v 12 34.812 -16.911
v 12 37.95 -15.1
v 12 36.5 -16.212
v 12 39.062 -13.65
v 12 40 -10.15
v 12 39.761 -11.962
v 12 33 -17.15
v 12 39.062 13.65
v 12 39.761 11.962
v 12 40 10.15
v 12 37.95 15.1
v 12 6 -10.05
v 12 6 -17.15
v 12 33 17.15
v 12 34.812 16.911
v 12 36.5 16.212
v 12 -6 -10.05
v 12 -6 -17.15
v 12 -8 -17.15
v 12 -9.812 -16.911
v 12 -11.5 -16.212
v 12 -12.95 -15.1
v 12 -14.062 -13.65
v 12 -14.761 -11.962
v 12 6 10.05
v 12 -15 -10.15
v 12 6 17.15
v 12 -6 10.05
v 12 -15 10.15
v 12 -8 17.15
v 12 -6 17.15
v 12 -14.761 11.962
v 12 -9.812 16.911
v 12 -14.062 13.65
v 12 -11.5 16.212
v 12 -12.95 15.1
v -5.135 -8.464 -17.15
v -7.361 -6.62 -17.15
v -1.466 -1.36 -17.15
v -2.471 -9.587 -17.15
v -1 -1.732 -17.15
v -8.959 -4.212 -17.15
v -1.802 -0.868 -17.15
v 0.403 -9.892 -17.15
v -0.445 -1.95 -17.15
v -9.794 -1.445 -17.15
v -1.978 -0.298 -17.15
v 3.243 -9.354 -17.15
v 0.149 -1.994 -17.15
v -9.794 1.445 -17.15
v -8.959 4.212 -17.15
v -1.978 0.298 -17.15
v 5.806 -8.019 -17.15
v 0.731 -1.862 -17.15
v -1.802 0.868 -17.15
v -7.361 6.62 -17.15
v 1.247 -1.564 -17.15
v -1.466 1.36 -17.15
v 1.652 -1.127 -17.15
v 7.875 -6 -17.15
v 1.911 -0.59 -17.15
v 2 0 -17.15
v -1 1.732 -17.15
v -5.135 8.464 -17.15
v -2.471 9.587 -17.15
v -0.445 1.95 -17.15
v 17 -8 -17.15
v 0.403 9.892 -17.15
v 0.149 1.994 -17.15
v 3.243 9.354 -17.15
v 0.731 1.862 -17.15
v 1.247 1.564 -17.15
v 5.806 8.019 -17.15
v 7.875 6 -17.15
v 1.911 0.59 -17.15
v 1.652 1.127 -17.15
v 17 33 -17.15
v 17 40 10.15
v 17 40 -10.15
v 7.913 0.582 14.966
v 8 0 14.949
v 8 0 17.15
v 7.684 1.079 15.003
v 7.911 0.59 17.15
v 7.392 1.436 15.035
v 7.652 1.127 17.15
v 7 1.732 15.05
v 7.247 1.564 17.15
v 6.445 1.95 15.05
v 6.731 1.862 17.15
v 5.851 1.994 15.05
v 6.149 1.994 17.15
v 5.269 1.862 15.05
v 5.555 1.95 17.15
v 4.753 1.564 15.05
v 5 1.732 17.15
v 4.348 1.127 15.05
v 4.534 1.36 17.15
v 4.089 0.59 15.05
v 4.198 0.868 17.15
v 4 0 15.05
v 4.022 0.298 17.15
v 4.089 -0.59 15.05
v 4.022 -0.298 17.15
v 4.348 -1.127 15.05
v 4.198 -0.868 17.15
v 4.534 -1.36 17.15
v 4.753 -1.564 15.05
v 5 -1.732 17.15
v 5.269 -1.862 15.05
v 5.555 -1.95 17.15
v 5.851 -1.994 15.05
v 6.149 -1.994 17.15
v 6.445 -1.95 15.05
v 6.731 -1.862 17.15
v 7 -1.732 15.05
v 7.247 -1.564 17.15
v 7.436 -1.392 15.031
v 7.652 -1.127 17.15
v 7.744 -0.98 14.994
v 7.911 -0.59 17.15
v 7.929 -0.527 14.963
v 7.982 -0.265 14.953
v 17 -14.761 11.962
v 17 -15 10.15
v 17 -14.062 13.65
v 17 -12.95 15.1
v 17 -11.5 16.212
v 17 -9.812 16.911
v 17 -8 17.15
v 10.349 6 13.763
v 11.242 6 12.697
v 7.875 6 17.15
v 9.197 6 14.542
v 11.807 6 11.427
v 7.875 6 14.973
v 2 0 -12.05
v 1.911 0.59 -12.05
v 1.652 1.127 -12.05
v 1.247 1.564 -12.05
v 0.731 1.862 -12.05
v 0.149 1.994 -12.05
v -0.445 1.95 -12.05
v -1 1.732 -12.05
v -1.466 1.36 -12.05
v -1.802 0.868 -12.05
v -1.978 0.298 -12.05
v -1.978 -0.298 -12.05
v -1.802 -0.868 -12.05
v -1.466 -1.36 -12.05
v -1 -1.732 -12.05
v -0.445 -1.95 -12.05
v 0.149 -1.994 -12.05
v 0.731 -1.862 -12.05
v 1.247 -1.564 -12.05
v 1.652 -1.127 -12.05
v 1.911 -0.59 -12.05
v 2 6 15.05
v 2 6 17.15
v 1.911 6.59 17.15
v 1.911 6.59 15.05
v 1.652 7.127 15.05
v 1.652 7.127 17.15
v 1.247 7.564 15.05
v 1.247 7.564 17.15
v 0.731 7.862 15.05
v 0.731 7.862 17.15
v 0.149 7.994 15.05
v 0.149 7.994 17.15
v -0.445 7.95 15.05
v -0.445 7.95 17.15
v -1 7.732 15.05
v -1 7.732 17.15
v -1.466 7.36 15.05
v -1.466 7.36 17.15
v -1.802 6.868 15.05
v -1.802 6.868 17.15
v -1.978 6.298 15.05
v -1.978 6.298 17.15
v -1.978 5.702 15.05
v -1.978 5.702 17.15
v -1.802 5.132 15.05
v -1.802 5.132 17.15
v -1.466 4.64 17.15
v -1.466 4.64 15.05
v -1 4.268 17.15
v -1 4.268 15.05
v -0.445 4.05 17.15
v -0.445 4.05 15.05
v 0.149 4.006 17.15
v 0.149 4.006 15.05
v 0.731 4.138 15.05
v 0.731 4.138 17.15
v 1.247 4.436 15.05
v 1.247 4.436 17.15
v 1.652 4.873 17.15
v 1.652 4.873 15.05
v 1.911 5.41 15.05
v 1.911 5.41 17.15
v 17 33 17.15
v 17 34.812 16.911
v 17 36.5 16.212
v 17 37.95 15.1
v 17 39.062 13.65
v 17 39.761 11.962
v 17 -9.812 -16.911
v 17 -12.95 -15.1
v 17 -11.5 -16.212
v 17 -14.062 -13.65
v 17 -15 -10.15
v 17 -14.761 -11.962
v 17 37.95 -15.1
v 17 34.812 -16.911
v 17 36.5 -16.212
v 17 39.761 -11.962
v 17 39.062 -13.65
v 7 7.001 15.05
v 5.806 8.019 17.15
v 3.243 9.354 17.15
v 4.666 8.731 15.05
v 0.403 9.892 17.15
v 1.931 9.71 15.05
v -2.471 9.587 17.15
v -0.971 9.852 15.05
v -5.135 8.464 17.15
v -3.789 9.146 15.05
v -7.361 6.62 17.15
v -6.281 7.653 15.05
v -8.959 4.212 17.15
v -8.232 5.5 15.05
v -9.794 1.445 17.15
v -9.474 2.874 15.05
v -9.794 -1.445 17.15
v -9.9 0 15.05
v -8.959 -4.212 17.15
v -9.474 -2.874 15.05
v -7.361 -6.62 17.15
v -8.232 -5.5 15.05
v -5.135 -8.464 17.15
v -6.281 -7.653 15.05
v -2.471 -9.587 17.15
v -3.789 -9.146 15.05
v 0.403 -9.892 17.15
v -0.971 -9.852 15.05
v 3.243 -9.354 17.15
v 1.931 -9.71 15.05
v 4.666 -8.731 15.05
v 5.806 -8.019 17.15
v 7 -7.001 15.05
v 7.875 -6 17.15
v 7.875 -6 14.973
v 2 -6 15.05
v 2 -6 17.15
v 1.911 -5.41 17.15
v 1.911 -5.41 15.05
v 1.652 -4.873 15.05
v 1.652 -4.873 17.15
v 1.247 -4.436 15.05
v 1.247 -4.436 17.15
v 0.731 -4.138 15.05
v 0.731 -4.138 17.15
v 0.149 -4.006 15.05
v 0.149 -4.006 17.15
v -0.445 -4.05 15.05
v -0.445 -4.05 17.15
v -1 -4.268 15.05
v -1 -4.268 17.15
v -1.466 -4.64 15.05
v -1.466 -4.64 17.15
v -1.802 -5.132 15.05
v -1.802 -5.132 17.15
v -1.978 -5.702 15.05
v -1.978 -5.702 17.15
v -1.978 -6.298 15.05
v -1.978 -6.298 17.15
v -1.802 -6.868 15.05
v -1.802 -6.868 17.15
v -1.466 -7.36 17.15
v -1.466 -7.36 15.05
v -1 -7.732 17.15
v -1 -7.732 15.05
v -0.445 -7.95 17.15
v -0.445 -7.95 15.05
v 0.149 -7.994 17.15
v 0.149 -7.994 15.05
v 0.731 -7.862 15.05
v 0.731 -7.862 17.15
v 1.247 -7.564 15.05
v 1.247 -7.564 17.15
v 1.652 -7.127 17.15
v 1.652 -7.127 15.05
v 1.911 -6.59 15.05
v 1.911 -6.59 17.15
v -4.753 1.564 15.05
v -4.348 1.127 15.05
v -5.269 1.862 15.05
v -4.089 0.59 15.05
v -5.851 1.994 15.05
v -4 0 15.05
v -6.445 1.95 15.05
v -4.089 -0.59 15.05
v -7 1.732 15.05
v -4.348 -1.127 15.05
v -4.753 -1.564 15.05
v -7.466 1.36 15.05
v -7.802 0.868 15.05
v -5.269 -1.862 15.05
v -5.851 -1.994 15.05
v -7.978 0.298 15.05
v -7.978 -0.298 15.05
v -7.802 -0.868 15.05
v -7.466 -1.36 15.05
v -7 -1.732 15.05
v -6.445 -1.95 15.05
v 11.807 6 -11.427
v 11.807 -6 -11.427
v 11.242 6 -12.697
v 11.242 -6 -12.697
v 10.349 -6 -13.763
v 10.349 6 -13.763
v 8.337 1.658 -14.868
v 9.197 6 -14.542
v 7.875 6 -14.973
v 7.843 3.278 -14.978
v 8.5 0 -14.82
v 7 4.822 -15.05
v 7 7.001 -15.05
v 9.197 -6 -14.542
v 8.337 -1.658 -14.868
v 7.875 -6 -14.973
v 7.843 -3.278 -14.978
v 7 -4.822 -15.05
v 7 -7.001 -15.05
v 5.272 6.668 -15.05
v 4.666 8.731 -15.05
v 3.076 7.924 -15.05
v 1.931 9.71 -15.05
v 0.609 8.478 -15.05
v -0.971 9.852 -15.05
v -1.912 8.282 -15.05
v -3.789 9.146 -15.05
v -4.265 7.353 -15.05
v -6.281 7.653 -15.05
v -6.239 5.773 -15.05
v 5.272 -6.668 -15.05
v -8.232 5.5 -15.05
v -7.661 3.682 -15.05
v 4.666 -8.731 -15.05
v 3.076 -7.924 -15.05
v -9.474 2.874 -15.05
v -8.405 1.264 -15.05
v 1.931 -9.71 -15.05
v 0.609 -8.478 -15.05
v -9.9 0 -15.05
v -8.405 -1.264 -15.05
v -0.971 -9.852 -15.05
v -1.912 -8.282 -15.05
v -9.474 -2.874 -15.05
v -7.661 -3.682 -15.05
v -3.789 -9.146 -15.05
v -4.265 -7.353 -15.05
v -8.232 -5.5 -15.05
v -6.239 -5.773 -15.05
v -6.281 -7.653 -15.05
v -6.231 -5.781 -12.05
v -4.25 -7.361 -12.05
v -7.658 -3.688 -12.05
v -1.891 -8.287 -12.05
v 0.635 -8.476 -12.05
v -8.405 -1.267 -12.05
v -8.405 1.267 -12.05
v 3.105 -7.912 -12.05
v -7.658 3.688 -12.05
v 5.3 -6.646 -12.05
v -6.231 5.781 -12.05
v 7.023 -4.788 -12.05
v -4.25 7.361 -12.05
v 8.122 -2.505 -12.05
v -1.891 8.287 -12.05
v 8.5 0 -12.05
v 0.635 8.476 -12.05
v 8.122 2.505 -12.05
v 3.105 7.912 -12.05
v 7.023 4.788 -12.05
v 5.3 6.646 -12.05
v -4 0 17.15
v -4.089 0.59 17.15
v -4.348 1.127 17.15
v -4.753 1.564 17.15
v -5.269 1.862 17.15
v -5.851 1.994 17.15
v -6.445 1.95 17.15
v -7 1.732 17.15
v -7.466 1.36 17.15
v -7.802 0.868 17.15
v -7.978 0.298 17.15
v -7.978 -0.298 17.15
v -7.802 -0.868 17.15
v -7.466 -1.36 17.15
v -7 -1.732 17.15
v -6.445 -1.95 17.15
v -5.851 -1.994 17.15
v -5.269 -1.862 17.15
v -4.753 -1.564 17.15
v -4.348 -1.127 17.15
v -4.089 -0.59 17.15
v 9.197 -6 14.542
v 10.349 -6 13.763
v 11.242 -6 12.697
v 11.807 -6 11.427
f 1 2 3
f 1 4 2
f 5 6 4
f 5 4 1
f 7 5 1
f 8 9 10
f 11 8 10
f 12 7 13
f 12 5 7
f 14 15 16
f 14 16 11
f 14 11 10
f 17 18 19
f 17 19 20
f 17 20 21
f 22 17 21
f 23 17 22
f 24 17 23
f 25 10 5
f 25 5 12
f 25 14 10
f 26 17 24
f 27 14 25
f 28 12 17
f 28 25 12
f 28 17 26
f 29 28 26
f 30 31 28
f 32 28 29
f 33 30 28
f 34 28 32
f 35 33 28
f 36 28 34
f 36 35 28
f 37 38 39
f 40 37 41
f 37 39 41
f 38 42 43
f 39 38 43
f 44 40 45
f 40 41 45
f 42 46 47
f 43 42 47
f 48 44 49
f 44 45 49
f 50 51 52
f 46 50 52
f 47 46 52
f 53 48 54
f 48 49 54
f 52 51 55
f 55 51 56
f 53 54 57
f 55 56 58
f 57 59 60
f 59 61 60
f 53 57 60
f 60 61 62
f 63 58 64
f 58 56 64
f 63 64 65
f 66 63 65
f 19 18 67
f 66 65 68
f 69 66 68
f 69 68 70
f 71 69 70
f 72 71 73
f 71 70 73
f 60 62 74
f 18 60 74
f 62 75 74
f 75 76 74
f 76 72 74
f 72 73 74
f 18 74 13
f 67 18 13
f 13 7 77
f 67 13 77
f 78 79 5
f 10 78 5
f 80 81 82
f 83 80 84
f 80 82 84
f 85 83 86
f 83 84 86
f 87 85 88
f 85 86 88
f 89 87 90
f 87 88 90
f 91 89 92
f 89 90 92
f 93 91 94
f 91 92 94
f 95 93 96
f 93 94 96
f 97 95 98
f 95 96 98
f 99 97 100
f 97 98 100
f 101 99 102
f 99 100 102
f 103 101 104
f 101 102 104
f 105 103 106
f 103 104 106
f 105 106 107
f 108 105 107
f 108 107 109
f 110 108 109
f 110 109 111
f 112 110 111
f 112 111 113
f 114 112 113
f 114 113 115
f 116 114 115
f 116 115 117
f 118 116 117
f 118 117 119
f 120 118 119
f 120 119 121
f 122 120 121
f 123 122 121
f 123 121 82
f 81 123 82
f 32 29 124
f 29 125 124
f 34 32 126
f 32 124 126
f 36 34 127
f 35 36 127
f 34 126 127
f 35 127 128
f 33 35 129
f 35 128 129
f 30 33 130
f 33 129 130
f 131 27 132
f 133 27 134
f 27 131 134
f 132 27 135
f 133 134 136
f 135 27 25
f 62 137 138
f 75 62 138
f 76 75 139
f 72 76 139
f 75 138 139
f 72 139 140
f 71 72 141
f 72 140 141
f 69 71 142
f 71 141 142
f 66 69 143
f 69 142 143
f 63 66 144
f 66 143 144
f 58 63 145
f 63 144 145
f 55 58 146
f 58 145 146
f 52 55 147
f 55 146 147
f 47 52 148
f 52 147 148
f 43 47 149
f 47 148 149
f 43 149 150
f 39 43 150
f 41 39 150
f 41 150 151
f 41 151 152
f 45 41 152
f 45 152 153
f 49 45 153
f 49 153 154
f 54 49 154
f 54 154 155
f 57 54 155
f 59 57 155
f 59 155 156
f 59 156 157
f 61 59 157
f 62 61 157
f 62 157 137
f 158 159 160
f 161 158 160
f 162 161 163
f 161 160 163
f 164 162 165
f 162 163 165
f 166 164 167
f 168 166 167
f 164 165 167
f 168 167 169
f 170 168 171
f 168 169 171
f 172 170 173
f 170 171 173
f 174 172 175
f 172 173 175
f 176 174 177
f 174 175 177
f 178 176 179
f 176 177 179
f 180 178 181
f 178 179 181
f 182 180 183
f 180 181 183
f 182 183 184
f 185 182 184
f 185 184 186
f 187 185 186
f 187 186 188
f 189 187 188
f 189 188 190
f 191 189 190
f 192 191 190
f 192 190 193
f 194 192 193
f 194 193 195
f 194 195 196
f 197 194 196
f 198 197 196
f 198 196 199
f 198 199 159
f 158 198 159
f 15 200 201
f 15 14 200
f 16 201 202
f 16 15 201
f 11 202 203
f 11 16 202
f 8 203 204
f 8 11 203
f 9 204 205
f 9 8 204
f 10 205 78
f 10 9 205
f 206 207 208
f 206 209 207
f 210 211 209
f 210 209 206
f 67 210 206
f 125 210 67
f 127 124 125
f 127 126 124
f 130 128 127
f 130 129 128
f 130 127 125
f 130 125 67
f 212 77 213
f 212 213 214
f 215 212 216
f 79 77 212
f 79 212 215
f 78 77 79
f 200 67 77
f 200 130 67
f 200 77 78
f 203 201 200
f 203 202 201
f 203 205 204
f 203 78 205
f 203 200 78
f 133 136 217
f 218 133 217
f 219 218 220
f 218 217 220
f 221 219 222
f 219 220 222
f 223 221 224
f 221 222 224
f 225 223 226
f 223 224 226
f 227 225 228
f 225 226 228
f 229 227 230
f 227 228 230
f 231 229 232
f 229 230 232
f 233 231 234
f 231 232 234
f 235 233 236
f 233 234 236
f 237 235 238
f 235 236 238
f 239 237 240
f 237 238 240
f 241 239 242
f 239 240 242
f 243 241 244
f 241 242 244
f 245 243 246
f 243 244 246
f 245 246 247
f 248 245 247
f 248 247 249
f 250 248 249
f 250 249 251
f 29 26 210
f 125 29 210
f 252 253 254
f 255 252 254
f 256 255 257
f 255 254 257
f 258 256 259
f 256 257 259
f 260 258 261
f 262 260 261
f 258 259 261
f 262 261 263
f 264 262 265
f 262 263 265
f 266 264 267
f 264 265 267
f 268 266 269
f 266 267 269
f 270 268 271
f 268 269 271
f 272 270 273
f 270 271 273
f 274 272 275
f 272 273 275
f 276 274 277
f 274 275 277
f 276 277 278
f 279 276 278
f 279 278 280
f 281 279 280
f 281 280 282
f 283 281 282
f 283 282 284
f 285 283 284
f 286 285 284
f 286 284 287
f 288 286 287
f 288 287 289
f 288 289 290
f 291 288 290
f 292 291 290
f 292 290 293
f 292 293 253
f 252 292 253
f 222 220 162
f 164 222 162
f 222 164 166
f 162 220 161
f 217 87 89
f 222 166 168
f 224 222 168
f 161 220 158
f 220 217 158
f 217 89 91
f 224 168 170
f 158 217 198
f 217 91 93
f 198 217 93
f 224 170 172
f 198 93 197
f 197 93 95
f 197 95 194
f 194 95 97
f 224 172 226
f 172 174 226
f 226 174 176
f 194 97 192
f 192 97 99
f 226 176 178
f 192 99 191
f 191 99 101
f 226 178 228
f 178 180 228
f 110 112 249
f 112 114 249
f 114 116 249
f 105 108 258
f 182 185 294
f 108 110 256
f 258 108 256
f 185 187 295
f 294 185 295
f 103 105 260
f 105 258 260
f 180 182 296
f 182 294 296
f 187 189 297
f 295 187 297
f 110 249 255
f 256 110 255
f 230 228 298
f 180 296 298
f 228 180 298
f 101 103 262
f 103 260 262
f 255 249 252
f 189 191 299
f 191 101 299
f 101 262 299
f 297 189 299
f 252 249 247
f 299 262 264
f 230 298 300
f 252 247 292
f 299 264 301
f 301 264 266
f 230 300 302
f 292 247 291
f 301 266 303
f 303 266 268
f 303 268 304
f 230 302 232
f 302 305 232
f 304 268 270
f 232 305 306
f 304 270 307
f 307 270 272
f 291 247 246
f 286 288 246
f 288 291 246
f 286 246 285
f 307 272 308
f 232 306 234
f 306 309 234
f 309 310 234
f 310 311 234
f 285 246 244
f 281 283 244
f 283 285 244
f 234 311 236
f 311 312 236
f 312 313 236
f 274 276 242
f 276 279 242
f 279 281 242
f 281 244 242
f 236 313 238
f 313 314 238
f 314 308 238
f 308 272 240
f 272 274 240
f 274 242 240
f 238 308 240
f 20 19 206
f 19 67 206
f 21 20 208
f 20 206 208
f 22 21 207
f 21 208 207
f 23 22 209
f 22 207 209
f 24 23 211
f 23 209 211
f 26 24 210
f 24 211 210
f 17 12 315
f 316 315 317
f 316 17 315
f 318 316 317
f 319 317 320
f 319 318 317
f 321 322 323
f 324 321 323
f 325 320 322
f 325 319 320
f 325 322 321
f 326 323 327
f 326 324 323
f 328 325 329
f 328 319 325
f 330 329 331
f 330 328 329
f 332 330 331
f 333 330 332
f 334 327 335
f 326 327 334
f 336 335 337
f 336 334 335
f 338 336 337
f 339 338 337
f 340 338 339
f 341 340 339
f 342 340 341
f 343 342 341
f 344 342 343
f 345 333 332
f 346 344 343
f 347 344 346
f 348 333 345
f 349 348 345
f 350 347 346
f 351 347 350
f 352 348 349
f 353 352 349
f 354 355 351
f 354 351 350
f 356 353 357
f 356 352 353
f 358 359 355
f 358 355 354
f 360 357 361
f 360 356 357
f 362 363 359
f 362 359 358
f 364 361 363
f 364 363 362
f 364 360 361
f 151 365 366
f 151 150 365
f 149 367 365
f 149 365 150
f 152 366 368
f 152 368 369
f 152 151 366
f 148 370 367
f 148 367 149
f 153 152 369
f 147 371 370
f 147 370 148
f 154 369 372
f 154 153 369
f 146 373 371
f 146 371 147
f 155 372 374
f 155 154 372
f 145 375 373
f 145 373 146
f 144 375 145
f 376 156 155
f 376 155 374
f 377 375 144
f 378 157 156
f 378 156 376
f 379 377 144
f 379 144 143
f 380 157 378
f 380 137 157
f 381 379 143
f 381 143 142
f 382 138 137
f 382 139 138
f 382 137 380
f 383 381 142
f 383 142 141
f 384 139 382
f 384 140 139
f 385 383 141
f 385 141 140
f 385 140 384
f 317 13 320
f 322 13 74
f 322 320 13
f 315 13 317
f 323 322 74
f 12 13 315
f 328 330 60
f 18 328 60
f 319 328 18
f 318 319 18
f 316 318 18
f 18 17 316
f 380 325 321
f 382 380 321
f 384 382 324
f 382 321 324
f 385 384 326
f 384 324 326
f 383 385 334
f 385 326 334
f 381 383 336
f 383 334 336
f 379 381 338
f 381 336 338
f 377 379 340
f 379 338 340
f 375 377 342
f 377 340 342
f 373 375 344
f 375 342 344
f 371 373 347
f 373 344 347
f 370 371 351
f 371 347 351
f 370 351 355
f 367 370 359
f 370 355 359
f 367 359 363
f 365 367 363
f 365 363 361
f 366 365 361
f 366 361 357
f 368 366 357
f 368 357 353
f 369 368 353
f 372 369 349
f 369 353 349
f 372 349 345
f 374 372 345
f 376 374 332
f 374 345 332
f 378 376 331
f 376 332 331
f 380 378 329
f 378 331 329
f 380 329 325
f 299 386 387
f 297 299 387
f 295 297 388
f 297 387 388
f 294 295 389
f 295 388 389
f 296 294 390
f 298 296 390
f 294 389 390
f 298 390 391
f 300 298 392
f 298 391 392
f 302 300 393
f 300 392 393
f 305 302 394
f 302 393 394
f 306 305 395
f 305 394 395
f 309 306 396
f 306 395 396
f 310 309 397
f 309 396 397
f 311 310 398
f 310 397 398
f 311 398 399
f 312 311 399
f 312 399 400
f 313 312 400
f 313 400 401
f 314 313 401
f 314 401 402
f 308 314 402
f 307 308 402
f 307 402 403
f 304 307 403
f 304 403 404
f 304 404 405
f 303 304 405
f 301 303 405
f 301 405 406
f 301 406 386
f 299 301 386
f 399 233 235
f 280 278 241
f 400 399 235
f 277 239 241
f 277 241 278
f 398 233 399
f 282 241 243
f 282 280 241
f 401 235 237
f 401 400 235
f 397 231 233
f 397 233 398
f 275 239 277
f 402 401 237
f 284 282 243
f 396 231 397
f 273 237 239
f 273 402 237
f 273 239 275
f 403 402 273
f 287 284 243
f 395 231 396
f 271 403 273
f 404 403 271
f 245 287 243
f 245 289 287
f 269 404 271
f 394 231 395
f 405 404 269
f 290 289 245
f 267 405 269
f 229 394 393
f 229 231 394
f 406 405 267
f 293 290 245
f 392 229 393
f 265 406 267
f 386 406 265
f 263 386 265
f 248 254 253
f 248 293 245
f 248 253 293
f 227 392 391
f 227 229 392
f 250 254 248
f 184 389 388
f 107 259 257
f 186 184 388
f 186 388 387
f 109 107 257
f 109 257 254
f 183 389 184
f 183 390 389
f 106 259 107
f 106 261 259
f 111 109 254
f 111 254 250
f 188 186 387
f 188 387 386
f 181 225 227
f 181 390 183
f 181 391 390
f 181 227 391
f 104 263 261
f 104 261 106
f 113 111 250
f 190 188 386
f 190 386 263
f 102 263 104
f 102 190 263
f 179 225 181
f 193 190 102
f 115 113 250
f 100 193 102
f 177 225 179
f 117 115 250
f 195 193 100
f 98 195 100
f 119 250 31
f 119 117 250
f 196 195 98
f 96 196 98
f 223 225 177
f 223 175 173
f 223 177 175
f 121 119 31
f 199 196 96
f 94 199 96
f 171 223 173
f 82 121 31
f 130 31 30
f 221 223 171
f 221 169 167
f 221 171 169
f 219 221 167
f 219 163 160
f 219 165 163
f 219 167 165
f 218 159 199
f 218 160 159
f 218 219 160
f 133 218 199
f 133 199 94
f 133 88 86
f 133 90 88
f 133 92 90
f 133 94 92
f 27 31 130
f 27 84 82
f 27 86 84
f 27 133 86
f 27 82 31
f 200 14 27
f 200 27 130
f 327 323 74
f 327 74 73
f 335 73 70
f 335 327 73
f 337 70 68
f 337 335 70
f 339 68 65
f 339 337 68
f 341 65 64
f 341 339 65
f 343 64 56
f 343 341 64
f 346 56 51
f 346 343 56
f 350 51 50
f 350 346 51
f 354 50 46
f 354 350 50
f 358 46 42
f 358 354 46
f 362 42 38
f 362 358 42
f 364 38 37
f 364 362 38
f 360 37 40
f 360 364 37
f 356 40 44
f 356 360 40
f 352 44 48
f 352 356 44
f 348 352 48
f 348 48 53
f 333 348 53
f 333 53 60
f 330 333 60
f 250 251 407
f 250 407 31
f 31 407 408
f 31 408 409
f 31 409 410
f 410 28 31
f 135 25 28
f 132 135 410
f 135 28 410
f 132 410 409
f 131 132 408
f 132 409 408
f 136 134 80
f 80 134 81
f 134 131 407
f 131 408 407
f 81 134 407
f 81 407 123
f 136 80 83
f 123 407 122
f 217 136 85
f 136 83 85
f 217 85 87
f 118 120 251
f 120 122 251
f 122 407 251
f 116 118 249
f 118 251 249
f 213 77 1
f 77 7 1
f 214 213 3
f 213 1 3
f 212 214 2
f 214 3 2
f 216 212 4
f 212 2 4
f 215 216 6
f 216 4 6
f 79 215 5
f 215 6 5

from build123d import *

# Parameters (mm, degrees)
F1_DEPTH      = 17.15
F3_DEPTH      = 40.001
F3_DEPTH_BACK = 15.001
F5_R          = 8.5
F6_DEPTH      = 3
F7_R          = 2
F8_DEPTH      = 5.1010001
F9_R          = 2
F10_DEPTH     = 17.15
F11_R         = 7


with BuildPart() as f1:
    # F0 (on Top) → F1 (new body)
    with BuildSketch(Plane.XY):
        with BuildLine():
            Line((12, 6), (7.874642849, 6))
            ThreePointArc((7.874642849, 6), (-9.9, 0), (7.874642849, -6))
            Line((7.874642849, -6), (12, -6))
            Line((12, -6), (12, -15))
            Line((12, -15), (17, -15))
            Line((17, -15), (17, 40))
            Line((17, 40), (12, 40))
            Line((12, 40), (12, 6))
        make_face()
    extrude(amount=F1_DEPTH)

    # F2 (on Front) → F3 (cut, two sides)
    with BuildSketch(Plane.XZ) as f3_sk:
        with BuildLine():
            Line((7, 15.05), (-20, 15.05))
            Line((-20, 15.05), (-20, 0))
            Line((-20, 0), (12, 0))
            Line((12, 0), (12, 10.05))
            ThreePointArc((12, 10.05), (10.5355339059, 13.5855339059), (7, 15.05))
        make_face()
    extrude(amount=-F3_DEPTH, mode=Mode.SUBTRACT)
    extrude(f3_sk.sketch, amount=F3_DEPTH_BACK, mode=Mode.SUBTRACT)

    # F4: F1 across plane


with BuildPart() as f1_1:
    add(f1.part)
    add(f1.part.mirror(Plane.XY))

    # F5 (on face) → F6 (join)
    with BuildSketch(Plane.XY.offset(-15.05)):
        Circle(F5_R)
    extrude(amount=F6_DEPTH)

    # F7 (on face) → F8 (cut, through all)
    with BuildSketch(Plane.XY.offset(-12.05)):
        Circle(F7_R)
    extrude(amount=-F8_DEPTH, mode=Mode.SUBTRACT)

    # F9 (on face) → F10 (cut, through all)
    with BuildSketch(Plane.XY.offset(17.15)):
        with Locations((6, 0)):
            Circle(F9_R)
        with Locations((0, -6)):
            Circle(F9_R)
        with Locations((-6, 0)):
            Circle(F9_R)
        with Locations((0, 6)):
            Circle(F9_R)
    extrude(amount=-F10_DEPTH, mode=Mode.SUBTRACT)

    # F11
    f11_edges = [f1_1.edges().sort_by_distance(p)[0] for p in [
        (14.5, 40, 17.15),
        (14.5, 40, -17.15),
        (14.5, -15, -17.15),
        (14.5, -15, 17.15),
    ]]
    fillet(f11_edges, radius=F11_R)


solid = f1_1.part
